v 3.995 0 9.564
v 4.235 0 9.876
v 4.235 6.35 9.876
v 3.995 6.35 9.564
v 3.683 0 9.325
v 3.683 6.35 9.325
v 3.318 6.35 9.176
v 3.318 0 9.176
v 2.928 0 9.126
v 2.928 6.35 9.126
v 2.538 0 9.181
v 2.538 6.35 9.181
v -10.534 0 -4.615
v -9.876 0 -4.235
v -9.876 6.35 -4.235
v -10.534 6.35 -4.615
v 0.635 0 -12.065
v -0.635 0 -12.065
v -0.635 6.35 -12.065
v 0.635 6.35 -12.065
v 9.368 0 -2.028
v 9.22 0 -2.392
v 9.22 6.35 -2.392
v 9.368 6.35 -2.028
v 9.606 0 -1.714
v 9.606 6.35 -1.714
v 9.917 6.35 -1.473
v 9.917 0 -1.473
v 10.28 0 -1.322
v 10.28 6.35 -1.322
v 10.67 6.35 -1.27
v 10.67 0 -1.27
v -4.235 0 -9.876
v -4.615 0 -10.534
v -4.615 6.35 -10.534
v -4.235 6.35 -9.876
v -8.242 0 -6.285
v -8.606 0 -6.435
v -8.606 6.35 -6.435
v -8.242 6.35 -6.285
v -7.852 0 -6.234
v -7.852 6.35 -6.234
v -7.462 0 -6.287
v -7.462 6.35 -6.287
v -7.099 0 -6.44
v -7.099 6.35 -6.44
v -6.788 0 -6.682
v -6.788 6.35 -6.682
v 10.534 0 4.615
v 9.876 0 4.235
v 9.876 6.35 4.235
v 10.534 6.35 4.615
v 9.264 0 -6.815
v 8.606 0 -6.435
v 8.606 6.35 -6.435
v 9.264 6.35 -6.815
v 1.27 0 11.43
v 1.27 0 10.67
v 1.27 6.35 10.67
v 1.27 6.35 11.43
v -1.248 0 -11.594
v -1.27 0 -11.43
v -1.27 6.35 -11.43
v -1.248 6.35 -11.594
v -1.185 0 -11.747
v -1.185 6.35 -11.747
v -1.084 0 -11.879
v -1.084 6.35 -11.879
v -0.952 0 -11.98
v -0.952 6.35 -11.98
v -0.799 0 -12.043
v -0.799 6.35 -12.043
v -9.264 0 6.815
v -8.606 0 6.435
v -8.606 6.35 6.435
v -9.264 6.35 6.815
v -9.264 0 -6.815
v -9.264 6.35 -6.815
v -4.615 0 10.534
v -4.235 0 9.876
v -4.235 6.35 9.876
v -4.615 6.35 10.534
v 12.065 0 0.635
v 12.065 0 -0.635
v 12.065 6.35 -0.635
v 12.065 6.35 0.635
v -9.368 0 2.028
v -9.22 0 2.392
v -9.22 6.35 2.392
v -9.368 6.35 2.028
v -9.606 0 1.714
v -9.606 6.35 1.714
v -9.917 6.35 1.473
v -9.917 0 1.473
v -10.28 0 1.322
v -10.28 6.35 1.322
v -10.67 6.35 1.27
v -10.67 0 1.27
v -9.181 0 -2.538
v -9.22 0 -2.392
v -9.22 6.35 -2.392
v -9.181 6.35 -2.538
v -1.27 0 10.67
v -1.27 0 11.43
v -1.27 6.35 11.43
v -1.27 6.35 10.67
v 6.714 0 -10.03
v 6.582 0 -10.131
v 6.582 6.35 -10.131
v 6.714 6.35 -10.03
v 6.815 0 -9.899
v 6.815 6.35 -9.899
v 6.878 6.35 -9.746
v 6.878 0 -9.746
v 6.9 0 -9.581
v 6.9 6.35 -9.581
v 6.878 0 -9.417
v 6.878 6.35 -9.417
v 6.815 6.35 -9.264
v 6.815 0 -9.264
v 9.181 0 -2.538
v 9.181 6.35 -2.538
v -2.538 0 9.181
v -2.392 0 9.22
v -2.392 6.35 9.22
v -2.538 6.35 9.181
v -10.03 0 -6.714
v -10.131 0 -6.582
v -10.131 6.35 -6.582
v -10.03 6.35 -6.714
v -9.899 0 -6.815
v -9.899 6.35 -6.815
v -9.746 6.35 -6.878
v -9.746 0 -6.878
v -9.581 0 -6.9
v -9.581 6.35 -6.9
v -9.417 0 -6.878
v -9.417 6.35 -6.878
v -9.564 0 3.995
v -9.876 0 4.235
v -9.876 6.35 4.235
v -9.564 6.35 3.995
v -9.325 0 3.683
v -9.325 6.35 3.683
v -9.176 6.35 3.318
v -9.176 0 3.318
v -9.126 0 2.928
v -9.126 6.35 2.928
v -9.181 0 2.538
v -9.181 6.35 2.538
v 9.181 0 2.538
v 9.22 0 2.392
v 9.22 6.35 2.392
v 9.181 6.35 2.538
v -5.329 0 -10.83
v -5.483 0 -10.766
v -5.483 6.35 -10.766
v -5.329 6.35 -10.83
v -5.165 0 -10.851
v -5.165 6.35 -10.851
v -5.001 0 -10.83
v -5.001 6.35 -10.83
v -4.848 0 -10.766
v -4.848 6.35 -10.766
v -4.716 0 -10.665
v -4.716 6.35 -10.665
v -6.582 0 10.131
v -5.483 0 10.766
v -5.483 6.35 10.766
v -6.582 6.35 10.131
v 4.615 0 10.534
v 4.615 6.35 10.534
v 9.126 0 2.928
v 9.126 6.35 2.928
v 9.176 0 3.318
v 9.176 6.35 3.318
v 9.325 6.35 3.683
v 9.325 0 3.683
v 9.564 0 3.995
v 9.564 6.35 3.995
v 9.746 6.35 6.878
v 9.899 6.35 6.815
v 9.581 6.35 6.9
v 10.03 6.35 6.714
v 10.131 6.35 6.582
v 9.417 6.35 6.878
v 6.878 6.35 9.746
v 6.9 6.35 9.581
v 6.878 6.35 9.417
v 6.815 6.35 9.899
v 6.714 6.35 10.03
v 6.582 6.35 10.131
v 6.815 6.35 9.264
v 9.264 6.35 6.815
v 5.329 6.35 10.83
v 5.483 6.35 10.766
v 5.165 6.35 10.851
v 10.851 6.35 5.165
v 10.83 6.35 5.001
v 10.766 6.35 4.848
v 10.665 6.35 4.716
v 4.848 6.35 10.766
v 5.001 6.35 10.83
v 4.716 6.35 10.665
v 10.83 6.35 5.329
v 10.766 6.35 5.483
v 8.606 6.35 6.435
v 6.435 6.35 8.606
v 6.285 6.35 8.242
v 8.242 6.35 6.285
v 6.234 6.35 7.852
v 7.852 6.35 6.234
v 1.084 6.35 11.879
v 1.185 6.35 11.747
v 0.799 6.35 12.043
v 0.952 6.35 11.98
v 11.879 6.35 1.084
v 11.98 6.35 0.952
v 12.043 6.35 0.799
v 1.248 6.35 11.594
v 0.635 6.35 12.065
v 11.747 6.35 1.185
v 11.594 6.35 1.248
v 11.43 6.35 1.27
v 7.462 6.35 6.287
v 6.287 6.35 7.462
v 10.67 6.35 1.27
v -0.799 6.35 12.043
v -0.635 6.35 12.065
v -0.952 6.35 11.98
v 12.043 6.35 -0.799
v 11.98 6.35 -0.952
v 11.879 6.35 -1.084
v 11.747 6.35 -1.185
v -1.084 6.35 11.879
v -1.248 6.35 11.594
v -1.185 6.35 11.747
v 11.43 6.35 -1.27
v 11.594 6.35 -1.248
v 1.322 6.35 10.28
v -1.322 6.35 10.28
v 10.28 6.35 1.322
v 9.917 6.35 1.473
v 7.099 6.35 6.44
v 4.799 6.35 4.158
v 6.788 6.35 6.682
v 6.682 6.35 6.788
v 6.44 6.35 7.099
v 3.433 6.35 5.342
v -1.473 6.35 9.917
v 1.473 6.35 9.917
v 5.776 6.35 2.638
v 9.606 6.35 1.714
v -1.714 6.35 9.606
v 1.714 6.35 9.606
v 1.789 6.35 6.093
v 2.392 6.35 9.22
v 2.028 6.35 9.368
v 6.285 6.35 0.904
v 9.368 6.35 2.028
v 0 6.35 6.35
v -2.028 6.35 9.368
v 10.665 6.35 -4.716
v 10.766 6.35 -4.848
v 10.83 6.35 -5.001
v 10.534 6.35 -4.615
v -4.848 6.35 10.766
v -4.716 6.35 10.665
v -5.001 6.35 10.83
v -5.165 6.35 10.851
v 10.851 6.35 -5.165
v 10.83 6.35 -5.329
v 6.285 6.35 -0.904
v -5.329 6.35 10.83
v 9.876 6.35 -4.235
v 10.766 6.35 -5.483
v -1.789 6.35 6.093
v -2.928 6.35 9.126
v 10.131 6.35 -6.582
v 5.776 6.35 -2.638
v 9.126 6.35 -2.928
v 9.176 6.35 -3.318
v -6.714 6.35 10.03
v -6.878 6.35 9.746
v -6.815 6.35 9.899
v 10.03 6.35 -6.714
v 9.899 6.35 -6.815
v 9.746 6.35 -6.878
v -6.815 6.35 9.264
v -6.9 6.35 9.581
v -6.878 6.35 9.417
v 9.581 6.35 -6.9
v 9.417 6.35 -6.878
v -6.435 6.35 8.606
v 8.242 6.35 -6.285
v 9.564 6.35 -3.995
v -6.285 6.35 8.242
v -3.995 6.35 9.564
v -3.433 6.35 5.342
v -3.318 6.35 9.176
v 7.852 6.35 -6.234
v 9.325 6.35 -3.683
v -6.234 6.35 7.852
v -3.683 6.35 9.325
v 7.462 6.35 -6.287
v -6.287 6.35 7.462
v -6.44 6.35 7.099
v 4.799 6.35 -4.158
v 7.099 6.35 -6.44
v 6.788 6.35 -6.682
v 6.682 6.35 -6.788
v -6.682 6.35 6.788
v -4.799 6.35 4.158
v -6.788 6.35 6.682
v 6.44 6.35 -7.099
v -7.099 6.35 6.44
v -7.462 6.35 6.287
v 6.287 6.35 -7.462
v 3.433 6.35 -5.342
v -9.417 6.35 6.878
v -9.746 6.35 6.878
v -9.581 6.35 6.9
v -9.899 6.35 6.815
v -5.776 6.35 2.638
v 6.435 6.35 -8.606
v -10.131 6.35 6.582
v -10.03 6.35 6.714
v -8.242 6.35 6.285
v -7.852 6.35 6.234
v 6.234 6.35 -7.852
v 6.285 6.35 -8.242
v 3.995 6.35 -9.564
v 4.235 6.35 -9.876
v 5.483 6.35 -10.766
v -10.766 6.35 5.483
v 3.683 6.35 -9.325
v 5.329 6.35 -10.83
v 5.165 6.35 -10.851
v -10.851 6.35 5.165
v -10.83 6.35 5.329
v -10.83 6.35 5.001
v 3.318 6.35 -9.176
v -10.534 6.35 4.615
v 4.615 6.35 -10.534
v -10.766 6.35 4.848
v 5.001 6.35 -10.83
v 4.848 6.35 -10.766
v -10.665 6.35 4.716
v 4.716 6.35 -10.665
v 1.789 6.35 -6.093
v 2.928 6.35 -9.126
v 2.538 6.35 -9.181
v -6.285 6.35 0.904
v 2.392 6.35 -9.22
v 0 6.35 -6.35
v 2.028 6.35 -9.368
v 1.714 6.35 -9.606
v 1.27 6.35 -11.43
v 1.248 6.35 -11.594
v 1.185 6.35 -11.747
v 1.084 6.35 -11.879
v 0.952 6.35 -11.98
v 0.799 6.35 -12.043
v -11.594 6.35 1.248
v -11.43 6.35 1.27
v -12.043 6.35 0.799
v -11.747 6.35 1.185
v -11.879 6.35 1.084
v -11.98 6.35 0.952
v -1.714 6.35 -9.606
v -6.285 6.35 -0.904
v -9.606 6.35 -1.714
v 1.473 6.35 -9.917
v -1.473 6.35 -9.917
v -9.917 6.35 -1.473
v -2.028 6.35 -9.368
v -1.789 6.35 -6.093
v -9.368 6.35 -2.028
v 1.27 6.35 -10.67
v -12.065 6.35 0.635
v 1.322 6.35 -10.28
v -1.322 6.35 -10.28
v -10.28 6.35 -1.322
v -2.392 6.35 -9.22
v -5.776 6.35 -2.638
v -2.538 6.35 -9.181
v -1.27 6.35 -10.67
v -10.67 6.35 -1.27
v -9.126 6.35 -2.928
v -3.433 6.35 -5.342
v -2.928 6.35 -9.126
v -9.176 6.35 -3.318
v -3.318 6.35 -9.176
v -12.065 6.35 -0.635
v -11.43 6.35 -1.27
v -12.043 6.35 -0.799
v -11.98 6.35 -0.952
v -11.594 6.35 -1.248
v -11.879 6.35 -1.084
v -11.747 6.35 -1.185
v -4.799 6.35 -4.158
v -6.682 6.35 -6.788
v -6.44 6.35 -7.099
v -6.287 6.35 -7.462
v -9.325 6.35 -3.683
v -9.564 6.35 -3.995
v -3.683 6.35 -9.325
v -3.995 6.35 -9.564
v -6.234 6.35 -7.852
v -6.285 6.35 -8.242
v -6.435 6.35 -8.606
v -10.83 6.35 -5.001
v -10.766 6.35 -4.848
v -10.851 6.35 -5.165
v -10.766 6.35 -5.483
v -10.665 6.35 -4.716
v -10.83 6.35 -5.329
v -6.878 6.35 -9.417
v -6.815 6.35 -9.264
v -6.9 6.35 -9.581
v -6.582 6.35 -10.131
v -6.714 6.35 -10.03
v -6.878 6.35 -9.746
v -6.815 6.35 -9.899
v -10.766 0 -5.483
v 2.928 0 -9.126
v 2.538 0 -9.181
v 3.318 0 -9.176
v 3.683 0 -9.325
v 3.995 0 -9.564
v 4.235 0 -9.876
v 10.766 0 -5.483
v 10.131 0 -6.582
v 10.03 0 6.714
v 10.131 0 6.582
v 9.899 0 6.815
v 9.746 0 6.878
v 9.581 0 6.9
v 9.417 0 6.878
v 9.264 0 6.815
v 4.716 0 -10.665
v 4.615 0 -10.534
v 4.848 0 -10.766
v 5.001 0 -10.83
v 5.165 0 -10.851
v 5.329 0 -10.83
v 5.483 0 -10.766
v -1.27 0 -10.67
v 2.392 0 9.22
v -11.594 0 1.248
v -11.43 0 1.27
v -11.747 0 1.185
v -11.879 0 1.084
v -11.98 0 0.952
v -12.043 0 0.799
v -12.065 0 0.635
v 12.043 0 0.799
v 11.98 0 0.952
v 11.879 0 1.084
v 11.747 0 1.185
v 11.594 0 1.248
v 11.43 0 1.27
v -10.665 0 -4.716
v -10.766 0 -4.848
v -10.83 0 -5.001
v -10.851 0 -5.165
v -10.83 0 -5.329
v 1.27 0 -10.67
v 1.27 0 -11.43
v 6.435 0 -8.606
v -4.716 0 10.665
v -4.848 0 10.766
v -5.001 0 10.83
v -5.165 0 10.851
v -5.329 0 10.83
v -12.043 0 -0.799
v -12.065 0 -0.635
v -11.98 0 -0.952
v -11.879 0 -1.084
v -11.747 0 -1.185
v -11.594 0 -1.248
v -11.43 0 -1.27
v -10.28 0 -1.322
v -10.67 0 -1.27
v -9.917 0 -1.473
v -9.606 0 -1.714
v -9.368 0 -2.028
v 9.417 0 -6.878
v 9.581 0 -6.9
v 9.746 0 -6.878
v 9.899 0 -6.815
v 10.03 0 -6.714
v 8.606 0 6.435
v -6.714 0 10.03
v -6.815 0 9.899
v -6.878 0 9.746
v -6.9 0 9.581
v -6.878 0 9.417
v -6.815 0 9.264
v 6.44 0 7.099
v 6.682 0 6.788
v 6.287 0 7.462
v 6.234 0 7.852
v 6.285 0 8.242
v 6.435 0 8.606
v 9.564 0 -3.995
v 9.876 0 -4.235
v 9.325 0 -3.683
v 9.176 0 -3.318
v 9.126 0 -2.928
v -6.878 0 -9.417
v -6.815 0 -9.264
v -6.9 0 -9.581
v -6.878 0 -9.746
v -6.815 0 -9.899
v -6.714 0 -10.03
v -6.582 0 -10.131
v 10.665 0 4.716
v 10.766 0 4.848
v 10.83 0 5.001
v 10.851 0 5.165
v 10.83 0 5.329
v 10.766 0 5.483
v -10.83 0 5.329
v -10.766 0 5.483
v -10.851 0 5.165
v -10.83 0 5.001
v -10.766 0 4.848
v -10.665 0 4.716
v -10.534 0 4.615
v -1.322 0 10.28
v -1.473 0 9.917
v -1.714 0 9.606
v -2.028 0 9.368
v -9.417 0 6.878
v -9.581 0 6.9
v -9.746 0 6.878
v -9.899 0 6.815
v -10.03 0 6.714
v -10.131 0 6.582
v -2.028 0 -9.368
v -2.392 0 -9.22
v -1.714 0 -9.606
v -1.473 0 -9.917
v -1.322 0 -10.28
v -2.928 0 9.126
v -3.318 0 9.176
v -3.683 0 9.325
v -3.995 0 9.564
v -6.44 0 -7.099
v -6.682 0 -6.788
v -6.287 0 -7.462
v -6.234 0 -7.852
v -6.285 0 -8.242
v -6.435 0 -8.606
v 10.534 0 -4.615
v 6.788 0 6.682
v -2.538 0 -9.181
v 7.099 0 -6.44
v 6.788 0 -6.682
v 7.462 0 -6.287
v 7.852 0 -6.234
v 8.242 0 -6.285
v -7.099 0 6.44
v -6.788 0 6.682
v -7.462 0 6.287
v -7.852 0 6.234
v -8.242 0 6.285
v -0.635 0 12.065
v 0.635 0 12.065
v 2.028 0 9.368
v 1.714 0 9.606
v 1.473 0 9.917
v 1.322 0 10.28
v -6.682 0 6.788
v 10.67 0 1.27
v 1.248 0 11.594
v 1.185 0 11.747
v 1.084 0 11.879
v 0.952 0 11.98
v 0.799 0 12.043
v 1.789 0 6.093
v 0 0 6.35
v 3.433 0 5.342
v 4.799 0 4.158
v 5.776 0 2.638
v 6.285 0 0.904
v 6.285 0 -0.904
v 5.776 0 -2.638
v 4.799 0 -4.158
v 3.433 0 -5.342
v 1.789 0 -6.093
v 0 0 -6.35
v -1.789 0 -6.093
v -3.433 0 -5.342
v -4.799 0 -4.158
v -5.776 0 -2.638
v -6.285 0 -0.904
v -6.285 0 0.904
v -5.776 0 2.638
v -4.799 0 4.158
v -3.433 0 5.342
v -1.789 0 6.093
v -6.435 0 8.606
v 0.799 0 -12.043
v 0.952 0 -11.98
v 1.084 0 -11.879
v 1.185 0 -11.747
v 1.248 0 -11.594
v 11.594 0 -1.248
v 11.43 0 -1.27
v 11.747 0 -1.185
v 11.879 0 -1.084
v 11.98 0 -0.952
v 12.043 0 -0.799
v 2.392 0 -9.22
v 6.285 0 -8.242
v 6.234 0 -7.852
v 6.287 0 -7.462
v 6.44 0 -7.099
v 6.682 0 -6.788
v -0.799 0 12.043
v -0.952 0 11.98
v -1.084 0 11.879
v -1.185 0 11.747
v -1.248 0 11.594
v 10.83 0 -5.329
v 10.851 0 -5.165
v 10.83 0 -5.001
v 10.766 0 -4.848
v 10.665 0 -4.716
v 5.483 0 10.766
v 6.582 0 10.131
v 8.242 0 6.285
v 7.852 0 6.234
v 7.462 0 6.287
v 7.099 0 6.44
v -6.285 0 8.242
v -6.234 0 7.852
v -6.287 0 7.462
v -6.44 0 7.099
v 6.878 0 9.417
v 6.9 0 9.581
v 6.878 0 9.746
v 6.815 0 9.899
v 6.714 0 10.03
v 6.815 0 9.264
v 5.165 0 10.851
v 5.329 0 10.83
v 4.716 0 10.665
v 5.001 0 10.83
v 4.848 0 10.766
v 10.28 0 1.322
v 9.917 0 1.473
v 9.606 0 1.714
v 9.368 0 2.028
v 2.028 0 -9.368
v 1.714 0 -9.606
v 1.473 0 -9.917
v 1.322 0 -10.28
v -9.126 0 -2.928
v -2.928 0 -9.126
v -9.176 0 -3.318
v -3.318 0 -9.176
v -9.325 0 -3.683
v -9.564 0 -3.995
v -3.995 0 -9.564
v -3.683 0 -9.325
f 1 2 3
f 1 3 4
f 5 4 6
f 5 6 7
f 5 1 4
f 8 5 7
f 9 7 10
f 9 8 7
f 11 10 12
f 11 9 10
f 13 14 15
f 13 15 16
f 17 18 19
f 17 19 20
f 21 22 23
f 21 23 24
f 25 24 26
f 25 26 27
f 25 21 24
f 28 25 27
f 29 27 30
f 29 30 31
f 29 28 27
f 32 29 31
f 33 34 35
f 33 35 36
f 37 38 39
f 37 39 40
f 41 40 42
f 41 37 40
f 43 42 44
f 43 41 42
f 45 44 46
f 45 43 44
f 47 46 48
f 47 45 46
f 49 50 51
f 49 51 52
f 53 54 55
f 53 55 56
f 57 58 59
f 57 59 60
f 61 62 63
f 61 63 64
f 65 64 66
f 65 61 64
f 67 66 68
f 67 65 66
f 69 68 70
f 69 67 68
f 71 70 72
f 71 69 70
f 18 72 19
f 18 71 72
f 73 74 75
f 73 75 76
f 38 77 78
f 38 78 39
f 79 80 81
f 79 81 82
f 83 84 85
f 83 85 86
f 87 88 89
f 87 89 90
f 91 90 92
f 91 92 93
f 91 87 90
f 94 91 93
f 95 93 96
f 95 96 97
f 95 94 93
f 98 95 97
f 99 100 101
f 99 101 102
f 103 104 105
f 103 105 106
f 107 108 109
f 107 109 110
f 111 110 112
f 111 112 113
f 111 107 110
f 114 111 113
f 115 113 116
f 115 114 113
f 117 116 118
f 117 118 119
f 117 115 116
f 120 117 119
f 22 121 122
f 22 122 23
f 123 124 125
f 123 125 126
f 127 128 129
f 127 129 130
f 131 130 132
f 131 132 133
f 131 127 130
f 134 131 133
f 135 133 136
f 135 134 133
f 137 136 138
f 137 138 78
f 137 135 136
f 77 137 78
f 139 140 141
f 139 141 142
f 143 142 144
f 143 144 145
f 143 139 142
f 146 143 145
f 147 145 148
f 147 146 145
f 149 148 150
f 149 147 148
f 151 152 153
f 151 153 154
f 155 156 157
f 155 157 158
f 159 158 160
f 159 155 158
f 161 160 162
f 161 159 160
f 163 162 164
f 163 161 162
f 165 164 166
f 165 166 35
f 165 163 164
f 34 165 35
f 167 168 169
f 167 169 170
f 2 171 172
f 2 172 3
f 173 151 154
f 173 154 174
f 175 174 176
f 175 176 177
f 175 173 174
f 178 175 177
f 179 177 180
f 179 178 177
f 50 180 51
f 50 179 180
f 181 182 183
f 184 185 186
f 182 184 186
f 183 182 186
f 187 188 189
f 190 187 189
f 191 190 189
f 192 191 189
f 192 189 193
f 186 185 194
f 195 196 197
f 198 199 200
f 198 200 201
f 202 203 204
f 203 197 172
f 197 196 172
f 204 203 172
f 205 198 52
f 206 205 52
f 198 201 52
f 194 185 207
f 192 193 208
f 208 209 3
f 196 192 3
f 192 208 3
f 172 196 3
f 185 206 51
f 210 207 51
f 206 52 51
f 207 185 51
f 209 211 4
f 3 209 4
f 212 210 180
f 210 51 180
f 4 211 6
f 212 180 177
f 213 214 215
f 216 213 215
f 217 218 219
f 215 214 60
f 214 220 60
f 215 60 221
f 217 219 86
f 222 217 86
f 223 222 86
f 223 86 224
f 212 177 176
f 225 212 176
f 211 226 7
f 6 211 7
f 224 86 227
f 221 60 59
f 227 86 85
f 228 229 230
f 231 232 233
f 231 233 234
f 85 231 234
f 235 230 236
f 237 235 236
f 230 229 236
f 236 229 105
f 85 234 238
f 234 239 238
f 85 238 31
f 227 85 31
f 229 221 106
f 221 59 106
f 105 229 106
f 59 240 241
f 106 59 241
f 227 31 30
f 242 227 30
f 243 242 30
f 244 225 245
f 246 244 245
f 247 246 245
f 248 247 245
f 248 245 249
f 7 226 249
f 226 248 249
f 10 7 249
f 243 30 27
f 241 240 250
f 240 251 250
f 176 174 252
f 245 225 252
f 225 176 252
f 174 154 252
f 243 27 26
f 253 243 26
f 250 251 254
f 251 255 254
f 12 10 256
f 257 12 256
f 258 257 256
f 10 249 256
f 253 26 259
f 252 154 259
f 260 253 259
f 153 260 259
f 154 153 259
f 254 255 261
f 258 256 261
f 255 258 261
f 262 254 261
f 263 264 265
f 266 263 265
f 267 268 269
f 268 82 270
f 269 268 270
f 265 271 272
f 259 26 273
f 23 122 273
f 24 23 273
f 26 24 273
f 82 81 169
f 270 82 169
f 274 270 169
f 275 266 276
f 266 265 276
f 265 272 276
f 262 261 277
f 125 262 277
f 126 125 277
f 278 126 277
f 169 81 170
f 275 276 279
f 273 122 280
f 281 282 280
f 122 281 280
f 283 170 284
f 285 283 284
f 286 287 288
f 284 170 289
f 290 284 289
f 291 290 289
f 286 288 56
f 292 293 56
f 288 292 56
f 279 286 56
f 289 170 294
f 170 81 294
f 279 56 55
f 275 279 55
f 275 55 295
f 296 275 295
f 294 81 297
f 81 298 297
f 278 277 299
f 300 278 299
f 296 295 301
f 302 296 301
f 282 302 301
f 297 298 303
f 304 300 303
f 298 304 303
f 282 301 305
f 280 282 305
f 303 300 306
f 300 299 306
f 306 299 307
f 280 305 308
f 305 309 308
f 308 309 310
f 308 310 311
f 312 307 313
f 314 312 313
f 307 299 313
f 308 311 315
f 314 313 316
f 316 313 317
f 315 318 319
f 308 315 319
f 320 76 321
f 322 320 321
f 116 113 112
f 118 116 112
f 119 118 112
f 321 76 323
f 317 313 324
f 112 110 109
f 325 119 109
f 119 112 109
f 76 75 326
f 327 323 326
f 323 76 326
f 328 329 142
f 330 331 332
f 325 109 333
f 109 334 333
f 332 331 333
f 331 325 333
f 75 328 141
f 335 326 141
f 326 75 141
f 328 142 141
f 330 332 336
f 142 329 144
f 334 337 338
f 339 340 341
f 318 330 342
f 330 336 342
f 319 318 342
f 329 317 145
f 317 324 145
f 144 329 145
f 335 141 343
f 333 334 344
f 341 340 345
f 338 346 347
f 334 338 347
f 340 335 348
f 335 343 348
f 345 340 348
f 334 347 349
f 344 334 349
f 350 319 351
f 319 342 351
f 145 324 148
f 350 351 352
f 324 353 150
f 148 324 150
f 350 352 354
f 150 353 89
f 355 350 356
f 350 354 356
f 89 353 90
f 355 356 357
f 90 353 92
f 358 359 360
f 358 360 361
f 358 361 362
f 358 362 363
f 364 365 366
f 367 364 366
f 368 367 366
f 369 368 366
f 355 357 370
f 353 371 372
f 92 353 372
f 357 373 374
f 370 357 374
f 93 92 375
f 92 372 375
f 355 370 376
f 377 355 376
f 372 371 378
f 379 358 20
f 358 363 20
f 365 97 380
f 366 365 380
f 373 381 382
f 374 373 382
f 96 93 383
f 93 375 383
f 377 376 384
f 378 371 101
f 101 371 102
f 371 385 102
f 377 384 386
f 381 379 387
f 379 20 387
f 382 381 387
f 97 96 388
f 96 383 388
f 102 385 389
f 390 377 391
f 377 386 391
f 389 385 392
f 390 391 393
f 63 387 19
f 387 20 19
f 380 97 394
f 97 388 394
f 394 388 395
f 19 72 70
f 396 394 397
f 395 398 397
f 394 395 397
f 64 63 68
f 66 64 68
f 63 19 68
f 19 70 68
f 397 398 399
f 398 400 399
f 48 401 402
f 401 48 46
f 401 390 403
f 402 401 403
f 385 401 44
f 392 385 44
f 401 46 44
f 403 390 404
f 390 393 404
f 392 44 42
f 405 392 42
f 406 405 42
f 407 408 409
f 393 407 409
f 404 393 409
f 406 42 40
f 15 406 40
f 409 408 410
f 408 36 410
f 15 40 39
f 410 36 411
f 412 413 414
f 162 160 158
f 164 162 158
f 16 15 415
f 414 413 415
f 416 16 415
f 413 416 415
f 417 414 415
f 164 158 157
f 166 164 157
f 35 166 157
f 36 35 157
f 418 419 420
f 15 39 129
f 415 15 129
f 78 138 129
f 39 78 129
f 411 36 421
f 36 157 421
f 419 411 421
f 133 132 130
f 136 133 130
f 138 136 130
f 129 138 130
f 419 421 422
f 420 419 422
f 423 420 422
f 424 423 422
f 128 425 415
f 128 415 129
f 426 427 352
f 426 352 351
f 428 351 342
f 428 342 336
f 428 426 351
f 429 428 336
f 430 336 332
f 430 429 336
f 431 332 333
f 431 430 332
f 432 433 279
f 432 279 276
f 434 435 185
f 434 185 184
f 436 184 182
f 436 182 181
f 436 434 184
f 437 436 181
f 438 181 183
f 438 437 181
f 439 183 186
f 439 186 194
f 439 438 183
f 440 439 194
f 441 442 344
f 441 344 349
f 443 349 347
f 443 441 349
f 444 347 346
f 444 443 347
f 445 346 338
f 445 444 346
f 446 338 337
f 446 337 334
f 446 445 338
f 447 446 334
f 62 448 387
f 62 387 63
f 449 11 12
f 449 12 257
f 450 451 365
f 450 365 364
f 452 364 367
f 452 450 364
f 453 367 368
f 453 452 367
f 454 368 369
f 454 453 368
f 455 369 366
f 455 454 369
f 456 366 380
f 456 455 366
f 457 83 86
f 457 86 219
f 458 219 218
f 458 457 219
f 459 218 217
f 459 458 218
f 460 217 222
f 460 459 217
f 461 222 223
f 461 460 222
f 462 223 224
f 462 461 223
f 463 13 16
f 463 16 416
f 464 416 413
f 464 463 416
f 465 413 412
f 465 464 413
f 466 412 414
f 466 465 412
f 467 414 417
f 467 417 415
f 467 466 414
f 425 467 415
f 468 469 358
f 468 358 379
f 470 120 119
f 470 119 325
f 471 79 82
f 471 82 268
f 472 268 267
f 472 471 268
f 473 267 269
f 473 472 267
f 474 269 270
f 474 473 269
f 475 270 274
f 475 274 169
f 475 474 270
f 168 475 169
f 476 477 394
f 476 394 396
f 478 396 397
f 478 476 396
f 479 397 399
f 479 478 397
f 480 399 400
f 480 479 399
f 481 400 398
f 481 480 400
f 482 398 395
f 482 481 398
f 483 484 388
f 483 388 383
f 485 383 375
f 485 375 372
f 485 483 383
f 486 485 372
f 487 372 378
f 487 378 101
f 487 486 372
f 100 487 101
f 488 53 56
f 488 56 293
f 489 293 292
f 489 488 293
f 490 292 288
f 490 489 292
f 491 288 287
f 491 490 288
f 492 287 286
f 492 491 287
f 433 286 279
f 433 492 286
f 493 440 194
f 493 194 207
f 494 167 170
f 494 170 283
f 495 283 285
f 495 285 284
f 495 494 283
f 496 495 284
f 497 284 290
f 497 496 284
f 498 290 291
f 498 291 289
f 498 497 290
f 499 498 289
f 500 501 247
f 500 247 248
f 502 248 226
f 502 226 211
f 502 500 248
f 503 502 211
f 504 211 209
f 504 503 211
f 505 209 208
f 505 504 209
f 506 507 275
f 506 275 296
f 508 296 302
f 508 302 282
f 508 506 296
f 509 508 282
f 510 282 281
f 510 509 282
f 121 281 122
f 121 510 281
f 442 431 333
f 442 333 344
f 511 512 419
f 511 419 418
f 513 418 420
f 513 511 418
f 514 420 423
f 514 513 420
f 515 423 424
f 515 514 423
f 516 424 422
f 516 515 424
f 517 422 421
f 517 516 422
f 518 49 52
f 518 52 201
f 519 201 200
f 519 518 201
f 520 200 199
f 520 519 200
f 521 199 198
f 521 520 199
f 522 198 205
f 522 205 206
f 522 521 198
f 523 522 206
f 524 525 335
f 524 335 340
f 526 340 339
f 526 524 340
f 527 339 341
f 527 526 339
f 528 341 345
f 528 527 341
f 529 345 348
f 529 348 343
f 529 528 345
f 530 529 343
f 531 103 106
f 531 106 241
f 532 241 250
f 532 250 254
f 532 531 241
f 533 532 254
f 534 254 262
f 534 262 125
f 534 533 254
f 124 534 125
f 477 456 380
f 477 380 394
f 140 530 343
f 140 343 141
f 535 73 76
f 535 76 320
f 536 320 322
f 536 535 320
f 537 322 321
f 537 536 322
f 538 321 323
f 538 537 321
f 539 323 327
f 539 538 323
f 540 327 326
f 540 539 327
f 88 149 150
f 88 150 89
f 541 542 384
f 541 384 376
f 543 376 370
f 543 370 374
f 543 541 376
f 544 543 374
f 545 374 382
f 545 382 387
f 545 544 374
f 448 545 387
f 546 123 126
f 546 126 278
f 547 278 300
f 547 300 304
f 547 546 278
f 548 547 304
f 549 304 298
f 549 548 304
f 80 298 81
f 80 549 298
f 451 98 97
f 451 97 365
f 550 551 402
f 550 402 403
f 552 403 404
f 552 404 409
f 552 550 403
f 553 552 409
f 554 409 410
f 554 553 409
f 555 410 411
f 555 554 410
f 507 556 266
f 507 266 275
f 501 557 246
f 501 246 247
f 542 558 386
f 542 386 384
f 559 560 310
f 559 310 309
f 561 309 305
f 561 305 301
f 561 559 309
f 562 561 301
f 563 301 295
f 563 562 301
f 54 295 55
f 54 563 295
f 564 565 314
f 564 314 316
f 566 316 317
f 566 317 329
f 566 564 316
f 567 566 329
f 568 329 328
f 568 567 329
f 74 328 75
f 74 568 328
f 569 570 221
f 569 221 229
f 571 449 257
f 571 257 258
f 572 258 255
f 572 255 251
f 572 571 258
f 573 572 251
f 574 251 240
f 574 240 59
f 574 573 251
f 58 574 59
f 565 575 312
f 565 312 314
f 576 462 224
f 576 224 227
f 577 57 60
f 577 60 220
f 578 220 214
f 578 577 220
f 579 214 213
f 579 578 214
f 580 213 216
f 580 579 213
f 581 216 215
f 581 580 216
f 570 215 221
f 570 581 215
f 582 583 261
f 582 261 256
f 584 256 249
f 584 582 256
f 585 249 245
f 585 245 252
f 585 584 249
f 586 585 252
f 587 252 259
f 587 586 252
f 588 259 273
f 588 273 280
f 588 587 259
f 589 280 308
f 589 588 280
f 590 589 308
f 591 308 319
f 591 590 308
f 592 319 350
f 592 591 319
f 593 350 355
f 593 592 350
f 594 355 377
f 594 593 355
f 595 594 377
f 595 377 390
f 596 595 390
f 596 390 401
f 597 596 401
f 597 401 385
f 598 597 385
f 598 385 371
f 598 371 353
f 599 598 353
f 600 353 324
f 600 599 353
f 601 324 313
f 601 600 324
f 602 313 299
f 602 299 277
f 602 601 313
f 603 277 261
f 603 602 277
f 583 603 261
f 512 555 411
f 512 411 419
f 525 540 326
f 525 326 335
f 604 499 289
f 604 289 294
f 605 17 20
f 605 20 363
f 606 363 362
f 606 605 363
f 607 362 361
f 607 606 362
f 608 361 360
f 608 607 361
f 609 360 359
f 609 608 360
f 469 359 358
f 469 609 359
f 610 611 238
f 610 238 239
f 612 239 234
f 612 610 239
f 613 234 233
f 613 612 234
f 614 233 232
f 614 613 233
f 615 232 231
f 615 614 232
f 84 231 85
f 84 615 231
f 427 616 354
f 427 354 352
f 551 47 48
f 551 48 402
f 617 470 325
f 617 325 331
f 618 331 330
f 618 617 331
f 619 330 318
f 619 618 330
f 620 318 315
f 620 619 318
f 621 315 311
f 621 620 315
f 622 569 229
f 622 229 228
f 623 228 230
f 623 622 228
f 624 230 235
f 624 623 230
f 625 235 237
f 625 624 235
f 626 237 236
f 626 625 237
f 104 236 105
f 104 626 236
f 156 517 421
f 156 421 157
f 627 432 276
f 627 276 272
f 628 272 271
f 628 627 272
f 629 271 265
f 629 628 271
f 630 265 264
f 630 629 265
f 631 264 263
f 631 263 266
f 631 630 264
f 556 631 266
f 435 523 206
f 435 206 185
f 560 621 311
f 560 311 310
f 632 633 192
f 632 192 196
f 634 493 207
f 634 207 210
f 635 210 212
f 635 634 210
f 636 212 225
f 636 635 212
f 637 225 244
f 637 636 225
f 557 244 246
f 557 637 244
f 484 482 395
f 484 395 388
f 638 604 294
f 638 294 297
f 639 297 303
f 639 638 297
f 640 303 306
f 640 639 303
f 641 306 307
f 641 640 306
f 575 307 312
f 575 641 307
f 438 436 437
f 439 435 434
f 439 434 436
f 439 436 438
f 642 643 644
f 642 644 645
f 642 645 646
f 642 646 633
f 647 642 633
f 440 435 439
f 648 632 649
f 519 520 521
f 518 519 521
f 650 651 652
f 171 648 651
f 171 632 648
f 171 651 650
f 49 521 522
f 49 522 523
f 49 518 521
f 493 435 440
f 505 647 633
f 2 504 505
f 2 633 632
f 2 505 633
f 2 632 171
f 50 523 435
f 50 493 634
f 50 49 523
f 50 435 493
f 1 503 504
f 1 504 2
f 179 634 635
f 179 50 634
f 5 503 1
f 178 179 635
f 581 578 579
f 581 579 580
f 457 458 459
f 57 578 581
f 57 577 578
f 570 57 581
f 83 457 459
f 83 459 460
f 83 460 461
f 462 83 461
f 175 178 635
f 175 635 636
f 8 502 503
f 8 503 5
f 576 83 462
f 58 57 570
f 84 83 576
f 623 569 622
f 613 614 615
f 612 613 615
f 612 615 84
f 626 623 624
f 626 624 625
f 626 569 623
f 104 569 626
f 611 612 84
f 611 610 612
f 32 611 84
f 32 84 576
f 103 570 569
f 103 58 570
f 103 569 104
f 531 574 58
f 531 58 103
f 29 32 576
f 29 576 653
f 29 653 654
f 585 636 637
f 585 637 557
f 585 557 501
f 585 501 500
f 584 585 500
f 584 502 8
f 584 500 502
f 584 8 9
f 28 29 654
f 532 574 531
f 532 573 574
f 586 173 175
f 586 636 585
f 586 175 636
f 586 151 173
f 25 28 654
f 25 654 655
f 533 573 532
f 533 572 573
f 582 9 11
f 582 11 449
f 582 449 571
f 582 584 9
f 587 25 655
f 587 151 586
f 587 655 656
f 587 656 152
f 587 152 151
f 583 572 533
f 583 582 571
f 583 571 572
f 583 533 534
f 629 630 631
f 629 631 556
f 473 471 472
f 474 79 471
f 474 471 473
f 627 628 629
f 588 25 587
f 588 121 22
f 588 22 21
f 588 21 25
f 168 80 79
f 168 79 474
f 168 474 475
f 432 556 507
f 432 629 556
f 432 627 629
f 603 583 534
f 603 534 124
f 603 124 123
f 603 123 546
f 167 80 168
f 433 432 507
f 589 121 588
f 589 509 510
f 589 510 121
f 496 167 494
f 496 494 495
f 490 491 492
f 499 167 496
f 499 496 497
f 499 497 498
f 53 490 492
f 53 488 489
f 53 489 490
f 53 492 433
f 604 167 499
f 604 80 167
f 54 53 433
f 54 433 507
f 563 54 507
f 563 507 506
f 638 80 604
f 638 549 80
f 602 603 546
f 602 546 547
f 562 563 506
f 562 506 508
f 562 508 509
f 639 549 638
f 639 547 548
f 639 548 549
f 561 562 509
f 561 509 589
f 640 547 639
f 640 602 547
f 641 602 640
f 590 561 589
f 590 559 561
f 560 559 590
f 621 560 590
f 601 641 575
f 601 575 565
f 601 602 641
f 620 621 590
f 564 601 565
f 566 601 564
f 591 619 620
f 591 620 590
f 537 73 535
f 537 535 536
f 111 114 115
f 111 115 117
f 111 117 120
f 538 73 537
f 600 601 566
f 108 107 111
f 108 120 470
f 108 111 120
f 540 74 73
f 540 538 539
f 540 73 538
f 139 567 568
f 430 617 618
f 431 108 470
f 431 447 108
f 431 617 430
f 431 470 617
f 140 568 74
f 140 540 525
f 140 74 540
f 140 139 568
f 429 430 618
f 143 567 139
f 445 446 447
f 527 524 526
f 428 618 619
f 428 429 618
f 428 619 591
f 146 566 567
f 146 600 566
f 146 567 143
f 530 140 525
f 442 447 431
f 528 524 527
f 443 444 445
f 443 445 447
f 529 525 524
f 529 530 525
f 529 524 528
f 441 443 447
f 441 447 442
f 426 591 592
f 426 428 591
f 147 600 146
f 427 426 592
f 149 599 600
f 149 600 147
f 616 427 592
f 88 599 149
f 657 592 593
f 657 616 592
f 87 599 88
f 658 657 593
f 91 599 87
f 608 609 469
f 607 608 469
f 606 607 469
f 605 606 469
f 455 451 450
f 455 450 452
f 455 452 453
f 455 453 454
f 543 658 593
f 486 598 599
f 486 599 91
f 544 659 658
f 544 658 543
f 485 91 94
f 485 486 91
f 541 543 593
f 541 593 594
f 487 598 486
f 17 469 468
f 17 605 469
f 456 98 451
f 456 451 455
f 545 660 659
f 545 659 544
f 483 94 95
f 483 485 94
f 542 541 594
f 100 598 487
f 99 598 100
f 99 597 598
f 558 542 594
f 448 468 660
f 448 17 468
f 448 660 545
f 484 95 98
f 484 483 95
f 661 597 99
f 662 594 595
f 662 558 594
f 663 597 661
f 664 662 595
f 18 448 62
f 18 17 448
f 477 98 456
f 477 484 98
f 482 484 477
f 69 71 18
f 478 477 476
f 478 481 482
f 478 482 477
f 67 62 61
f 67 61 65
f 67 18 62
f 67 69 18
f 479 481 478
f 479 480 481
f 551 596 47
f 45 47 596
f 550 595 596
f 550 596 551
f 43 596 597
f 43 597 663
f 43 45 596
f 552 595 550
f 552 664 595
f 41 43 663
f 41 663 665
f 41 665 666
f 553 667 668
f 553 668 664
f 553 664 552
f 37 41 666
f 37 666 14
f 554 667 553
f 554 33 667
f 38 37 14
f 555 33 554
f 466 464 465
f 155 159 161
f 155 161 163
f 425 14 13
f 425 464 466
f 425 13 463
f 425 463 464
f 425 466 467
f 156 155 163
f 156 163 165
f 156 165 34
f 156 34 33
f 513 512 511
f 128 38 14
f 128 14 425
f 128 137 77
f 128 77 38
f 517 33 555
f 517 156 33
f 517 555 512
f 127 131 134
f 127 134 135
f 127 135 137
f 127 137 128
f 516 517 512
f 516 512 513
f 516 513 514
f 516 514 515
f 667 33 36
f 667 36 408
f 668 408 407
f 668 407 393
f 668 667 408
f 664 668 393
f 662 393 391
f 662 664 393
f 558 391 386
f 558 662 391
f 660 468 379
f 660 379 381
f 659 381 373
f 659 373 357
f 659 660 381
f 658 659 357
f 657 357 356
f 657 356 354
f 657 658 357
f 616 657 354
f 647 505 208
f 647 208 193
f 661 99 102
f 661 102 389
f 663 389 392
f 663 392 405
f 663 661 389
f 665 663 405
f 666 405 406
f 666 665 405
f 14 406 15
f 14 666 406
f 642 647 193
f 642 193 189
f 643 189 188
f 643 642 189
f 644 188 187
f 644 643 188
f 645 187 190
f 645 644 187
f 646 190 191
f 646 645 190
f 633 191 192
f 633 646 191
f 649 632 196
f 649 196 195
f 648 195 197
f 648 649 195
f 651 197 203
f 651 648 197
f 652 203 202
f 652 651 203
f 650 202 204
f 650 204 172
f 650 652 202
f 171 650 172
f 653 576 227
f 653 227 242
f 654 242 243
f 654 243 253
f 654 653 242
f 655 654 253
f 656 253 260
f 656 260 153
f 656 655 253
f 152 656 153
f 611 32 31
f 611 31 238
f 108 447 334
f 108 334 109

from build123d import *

# Parameters (mm, degrees)
SKETCH1_R           = 6.35
BOSS_EXTRUDE1_DEPTH = 6.35


with BuildPart() as part:
    # Sketch1 → Boss-Extrude1 (new body)
    with BuildSketch(Plane(origin=(0, 0, 0), x_dir=(1, 0, 0), z_dir=(0, 1, 0))):
        with BuildLine():
            Line((-1.27, 10.670267616), (-1.27, 11.43))
            ThreePointArc((-1.27, 11.43), (-1.084012806, 11.879012806), (-0.635, 12.065))
            Line((-0.635, 12.065), (0.635, 12.065))
            ThreePointArc((0.635, 12.065), (1.084012806, 11.879012806), (1.27, 11.43))
            Line((1.27, 11.43), (1.27, 10.670267616))
            ThreePointArc((1.27, 10.670267616), (1.583306834, 9.753271395), (2.392223502, 9.219701281))
            Line((2.392223502, 9.219701281), (2.538124316, 9.180607276))
            ThreePointArc((2.538124316, 9.180607276), (3.505451757, 9.238234215), (4.235281545, 9.875722821))
            Line((4.235281545, 9.875722821), (4.615147737, 10.533670365))
            ThreePointArc((4.615147737, 10.533670365), (5.000723775, 10.829533265), (5.482573869, 10.766096497))
            Line((5.482573869, 10.766096497), (6.582426131, 10.131096497))
            ThreePointArc((6.582426131, 10.131096497), (6.878289031, 9.745520459), (6.814852263, 9.263670365))
            Line((6.814852263, 9.263670365), (6.434986071, 8.605722821))
            ThreePointArc((6.434986071, 8.605722821), (6.247819637, 7.654927381), (6.681576965, 6.788383774))
            Line((6.681576965, 6.788383774), (6.788383774, 6.681576965))
            ThreePointArc((6.788383774, 6.681576965), (7.654927381, 6.247819637), (8.605722821, 6.434986071))
            Line((8.605722821, 6.434986071), (9.263670365, 6.814852263))
            ThreePointArc((9.263670365, 6.814852263), (9.745520459, 6.878289031), (10.131096497, 6.582426131))
            Line((10.131096497, 6.582426131), (10.766096497, 5.482573869))
            ThreePointArc((10.766096497, 5.482573869), (10.829533265, 5.000723775), (10.533670365, 4.615147737))
            Line((10.533670365, 4.615147737), (9.875722821, 4.235281545))
            ThreePointArc((9.875722821, 4.235281545), (9.238234215, 3.505451757), (9.180607276, 2.538124316))
            Line((9.180607276, 2.538124316), (9.219701281, 2.392223502))
            ThreePointArc((9.219701281, 2.392223502), (9.753271395, 1.583306834), (10.670267616, 1.27))
            Line((10.670267616, 1.27), (11.43, 1.27))
            ThreePointArc((11.43, 1.27), (11.879012806, 1.084012806), (12.065, 0.635))
            Line((12.065, 0.635), (12.065, -0.635))
            ThreePointArc((12.065, -0.635), (11.879012806, -1.084012806), (11.43, -1.27))
            Line((11.43, -1.27), (10.670267616, -1.27))
            ThreePointArc((10.670267616, -1.27), (9.753271395, -1.583306834), (9.219701281, -2.392223502))
            Line((9.219701281, -2.392223502), (9.180607276, -2.538124316))
            ThreePointArc((9.180607276, -2.538124316), (9.238234215, -3.505451757), (9.875722821, -4.235281545))
            Line((9.875722821, -4.235281545), (10.533670365, -4.615147737))
            ThreePointArc((10.533670365, -4.615147737), (10.829533265, -5.000723775), (10.766096497, -5.482573869))
            Line((10.766096497, -5.482573869), (10.131096497, -6.582426131))
            ThreePointArc((10.131096497, -6.582426131), (9.745520459, -6.878289031), (9.263670365, -6.814852263))
            Line((9.263670365, -6.814852263), (8.605722821, -6.434986071))
            ThreePointArc((8.605722821, -6.434986071), (7.654927381, -6.247819637), (6.788383774, -6.681576965))
            Line((6.788383774, -6.681576965), (6.681576965, -6.788383774))
            ThreePointArc((6.681576965, -6.788383774), (6.247819637, -7.654927381), (6.434986071, -8.605722821))
            Line((6.434986071, -8.605722821), (6.814852263, -9.263670365))
            ThreePointArc((6.814852263, -9.263670365), (6.878289031, -9.745520459), (6.582426131, -10.131096497))
            Line((6.582426131, -10.131096497), (5.482573869, -10.766096497))
            ThreePointArc((5.482573869, -10.766096497), (5.000723775, -10.829533265), (4.615147737, -10.533670365))
            Line((4.615147737, -10.533670365), (4.235281545, -9.875722821))
            ThreePointArc((4.235281545, -9.875722821), (3.505451757, -9.238234215), (2.538124316, -9.180607276))
            Line((2.538124316, -9.180607276), (2.392223502, -9.219701281))
            ThreePointArc((2.392223502, -9.219701281), (1.583306834, -9.753271395), (1.27, -10.670267616))
            Line((1.27, -10.670267616), (1.27, -11.43))
            ThreePointArc((1.27, -11.43), (1.084012806, -11.879012806), (0.635, -12.065))
            Line((0.635, -12.065), (-0.635, -12.065))
            ThreePointArc((-0.635, -12.065), (-1.084012806, -11.879012806), (-1.27, -11.43))
            Line((-1.27, -11.43), (-1.27, -10.670267616))
            ThreePointArc((-1.27, -10.670267616), (-1.583306834, -9.753271395), (-2.392223502, -9.219701281))
            Line((-2.392223502, -9.219701281), (-2.538124316, -9.180607276))
            ThreePointArc((-2.538124316, -9.180607276), (-3.505451757, -9.238234215), (-4.235281545, -9.875722821))
            Line((-4.235281545, -9.875722821), (-4.615147737, -10.533670365))
            ThreePointArc((-4.615147737, -10.533670365), (-5.000723775, -10.829533265), (-5.482573869, -10.766096497))
            Line((-5.482573869, -10.766096497), (-6.582426131, -10.131096497))
            ThreePointArc((-6.582426131, -10.131096497), (-6.878289031, -9.745520459), (-6.814852263, -9.263670365))
            Line((-6.814852263, -9.263670365), (-6.434986071, -8.605722821))
            ThreePointArc((-6.434986071, -8.605722821), (-6.247819637, -7.654927381), (-6.681576965, -6.788383774))
            Line((-6.681576965, -6.788383774), (-6.788383774, -6.681576965))
            ThreePointArc((-6.788383774, -6.681576965), (-7.654927381, -6.247819637), (-8.605722821, -6.434986071))
            Line((-8.605722821, -6.434986071), (-9.263670365, -6.814852263))
            ThreePointArc((-9.263670365, -6.814852263), (-9.745520459, -6.878289031), (-10.131096497, -6.582426131))
            Line((-10.131096497, -6.582426131), (-10.766096497, -5.482573869))
            ThreePointArc((-10.766096497, -5.482573869), (-10.829533265, -5.000723775), (-10.533670365, -4.615147737))
            Line((-10.533670365, -4.615147737), (-9.875722821, -4.235281545))
            ThreePointArc((-9.875722821, -4.235281545), (-9.238234215, -3.505451757), (-9.180607276, -2.538124316))
            Line((-9.180607276, -2.538124316), (-9.219701281, -2.392223502))
            ThreePointArc((-9.219701281, -2.392223502), (-9.753271395, -1.583306834), (-10.670267616, -1.27))
            Line((-10.670267616, -1.27), (-11.43, -1.27))
            ThreePointArc((-11.43, -1.27), (-11.879012806, -1.084012806), (-12.065, -0.635))
            Line((-12.065, -0.635), (-12.065, 0.635))
            ThreePointArc((-12.065, 0.635), (-11.879012806, 1.084012806), (-11.43, 1.27))
            Line((-11.43, 1.27), (-10.670267616, 1.27))
            ThreePointArc((-10.670267616, 1.27), (-9.753271395, 1.583306834), (-9.219701281, 2.392223502))
            Line((-9.219701281, 2.392223502), (-9.180607276, 2.538124316))
            ThreePointArc((-9.180607276, 2.538124316), (-9.238234215, 3.505451757), (-9.875722821, 4.235281545))
            Line((-9.875722821, 4.235281545), (-10.533670365, 4.615147737))
            ThreePointArc((-10.533670365, 4.615147737), (-10.829533265, 5.000723775), (-10.766096497, 5.482573869))
            Line((-10.766096497, 5.482573869), (-10.131096497, 6.582426131))
            ThreePointArc((-10.131096497, 6.582426131), (-9.745520459, 6.878289031), (-9.263670365, 6.814852263))
            Line((-9.263670365, 6.814852263), (-8.605722821, 6.434986071))
            ThreePointArc((-8.605722821, 6.434986071), (-7.654927381, 6.247819637), (-6.788383774, 6.681576965))
            Line((-6.788383774, 6.681576965), (-6.681576965, 6.788383774))
            ThreePointArc((-6.681576965, 6.788383774), (-6.247819637, 7.654927381), (-6.434986071, 8.605722821))
            Line((-6.434986071, 8.605722821), (-6.814852263, 9.263670365))
            ThreePointArc((-6.814852263, 9.263670365), (-6.878289031, 9.745520459), (-6.582426131, 10.131096497))
            Line((-6.582426131, 10.131096497), (-5.482573869, 10.766096497))
            ThreePointArc((-5.482573869, 10.766096497), (-5.000723775, 10.829533265), (-4.615147737, 10.533670365))
            Line((-4.615147737, 10.533670365), (-4.235281545, 9.875722821))
            ThreePointArc((-4.235281545, 9.875722821), (-3.505451757, 9.238234215), (-2.538124316, 9.180607276))
            Line((-2.538124316, 9.180607276), (-2.392223502, 9.219701281))
            ThreePointArc((-2.392223502, 9.219701281), (-1.583306834, 9.753271395), (-1.27, 10.670267616))
        make_face()
        with Locations(Location((0, 0, 0), (0, 0, 270))):
            Circle(SKETCH1_R, mode=Mode.SUBTRACT)
    extrude(amount=BOSS_EXTRUDE1_DEPTH)


solid = part.part
